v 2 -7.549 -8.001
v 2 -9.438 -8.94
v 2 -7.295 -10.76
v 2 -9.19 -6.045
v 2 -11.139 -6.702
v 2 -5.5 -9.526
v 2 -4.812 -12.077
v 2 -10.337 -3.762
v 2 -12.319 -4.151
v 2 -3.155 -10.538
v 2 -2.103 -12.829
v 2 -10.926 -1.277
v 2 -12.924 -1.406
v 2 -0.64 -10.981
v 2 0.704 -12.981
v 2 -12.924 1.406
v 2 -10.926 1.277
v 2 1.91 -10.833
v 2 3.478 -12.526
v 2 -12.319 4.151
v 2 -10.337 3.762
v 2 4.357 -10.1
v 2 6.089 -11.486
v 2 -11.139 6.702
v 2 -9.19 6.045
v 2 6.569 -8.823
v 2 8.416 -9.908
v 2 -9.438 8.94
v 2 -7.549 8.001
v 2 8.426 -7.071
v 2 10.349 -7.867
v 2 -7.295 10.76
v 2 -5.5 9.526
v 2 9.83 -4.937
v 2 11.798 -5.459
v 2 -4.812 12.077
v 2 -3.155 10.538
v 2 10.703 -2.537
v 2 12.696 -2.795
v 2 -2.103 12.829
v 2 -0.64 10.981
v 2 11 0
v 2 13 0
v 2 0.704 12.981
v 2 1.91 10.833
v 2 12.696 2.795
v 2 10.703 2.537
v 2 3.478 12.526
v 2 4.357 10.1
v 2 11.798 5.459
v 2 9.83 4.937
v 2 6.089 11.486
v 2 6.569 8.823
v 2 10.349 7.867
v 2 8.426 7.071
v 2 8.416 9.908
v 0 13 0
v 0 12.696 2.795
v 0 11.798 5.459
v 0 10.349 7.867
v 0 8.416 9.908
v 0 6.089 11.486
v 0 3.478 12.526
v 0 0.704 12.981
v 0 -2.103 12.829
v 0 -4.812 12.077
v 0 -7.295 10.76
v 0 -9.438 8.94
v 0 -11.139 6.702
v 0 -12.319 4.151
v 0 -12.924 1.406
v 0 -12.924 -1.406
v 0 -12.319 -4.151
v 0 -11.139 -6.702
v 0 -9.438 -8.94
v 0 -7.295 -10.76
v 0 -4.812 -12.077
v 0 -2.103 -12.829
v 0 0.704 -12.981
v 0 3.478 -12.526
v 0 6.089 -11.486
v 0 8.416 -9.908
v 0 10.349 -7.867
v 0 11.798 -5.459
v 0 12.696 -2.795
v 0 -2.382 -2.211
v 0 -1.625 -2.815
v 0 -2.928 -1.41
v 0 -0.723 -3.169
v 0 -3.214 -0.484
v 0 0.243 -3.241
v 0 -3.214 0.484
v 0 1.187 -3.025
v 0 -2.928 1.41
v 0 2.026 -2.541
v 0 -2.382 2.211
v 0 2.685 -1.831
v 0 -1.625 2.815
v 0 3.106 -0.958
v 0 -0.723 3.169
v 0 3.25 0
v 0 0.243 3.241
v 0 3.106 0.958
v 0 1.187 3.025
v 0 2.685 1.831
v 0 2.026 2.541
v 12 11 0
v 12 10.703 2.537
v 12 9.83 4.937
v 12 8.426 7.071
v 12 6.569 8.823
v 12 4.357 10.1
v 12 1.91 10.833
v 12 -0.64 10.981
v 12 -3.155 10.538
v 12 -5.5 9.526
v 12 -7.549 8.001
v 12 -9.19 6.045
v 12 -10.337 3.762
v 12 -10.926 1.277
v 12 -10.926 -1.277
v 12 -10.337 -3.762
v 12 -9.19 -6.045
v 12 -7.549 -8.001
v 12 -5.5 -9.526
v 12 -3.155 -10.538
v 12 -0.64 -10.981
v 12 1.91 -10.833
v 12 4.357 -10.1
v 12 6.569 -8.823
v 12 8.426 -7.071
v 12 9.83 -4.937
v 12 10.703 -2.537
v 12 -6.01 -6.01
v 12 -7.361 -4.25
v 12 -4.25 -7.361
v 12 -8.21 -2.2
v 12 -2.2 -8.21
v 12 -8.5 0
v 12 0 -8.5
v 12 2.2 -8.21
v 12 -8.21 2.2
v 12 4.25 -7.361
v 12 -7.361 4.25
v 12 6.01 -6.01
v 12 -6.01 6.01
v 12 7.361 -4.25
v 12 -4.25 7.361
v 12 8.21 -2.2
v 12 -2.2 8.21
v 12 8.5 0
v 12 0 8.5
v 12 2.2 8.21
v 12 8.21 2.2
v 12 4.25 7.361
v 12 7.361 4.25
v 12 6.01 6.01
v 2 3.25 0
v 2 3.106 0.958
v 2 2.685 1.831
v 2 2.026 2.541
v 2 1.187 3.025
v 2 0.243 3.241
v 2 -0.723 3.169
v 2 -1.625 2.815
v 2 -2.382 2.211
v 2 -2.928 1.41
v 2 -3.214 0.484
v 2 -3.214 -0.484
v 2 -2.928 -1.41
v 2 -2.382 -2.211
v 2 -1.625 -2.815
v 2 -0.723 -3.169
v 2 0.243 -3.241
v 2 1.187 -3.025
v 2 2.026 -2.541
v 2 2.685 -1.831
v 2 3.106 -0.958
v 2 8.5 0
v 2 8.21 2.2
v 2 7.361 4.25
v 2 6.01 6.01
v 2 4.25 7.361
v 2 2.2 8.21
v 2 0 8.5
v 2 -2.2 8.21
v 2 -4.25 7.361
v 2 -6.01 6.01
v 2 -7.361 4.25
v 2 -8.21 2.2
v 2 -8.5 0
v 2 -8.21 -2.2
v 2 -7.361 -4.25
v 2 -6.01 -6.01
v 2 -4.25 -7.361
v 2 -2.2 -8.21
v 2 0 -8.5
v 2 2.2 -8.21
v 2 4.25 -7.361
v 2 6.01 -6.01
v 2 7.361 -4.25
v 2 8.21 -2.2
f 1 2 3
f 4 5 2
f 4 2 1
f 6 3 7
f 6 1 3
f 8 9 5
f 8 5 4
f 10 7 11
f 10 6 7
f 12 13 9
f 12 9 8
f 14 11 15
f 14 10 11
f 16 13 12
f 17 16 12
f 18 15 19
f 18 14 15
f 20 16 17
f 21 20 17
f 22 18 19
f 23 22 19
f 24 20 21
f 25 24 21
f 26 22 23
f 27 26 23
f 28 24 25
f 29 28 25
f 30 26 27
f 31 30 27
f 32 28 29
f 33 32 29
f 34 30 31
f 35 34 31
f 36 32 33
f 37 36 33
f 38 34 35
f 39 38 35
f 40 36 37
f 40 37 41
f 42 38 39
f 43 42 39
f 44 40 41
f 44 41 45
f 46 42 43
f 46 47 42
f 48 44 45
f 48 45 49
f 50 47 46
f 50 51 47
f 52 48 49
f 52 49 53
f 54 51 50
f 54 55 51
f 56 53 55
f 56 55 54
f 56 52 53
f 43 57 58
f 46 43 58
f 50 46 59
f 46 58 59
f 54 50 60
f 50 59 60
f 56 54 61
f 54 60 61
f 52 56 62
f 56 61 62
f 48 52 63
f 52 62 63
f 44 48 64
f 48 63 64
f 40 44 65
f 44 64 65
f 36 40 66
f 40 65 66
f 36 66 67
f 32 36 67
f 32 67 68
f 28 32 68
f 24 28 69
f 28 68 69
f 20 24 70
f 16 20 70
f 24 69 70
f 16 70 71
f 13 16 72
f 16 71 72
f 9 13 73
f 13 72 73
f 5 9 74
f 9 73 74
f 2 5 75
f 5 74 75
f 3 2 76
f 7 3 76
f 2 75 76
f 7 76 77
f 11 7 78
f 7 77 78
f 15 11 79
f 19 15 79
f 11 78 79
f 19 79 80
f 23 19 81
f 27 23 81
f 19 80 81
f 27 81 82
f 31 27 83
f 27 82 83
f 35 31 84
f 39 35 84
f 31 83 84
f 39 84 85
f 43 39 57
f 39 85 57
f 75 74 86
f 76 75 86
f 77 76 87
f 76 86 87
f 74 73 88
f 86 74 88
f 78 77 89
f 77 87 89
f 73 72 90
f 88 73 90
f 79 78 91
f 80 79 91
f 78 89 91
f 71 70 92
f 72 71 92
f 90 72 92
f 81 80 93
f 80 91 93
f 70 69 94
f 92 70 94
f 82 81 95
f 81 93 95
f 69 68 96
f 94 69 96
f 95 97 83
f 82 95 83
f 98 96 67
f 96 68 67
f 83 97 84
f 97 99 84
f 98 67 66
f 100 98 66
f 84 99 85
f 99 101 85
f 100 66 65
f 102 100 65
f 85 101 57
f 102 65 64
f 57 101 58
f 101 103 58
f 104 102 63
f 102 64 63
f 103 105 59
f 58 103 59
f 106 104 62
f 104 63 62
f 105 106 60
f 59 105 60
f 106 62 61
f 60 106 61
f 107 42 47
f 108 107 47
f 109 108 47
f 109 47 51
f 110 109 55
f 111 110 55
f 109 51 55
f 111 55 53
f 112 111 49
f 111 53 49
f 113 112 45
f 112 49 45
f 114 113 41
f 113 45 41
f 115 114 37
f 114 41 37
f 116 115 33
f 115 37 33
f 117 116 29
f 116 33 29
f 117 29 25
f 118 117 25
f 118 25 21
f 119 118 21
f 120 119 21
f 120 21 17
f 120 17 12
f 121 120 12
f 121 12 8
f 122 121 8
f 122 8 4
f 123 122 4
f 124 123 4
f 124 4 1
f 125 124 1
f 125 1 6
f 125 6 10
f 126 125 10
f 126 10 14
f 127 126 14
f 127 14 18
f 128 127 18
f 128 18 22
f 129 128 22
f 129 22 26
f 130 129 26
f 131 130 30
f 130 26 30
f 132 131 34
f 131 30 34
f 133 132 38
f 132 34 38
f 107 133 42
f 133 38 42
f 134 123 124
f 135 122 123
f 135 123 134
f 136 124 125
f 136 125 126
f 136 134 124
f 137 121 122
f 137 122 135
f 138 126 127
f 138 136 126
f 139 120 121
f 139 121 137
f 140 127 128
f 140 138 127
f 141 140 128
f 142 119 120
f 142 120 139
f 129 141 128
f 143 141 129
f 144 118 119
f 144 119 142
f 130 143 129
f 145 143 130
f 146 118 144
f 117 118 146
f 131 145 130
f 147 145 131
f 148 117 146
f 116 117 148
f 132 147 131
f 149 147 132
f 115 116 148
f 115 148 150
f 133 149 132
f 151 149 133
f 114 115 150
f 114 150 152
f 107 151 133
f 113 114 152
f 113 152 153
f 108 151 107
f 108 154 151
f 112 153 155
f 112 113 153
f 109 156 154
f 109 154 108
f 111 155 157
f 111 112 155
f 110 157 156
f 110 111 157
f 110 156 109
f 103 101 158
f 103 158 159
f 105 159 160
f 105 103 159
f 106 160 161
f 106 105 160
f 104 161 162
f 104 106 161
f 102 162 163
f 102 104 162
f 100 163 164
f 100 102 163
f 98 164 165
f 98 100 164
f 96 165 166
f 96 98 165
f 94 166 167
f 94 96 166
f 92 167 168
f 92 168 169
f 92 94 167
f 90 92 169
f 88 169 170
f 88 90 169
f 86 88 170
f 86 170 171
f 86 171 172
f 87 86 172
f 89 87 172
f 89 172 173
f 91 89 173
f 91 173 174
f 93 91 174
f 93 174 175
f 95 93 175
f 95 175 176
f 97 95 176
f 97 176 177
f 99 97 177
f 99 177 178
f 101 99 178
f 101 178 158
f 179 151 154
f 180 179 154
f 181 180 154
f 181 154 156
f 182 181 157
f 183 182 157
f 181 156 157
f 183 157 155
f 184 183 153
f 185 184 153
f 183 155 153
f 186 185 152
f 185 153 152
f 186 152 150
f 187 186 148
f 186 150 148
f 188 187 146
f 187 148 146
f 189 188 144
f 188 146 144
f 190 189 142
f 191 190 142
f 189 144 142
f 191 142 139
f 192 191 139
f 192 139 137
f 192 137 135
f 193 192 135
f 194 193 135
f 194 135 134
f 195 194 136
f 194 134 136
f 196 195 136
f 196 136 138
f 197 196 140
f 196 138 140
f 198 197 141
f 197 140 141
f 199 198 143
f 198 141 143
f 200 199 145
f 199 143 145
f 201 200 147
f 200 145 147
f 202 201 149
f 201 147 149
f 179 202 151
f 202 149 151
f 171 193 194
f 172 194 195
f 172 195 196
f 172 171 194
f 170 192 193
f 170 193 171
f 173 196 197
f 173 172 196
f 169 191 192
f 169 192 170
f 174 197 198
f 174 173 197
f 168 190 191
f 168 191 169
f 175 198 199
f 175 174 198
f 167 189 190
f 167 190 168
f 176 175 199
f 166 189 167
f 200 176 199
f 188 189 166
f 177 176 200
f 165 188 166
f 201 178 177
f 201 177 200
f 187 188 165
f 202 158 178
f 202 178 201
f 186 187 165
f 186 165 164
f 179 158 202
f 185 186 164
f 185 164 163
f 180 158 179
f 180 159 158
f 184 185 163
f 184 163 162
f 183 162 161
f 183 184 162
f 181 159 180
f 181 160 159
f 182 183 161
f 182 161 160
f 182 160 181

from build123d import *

# Parameters (mm, degrees)
F0_R         = 11
F0_R_2       = 9
F0_R_3       = 3.25
F1_DEPTH     = 12
F2_R         = 8.5
F2_R_2       = 3.25
F3_DEPTH     = 10
F0_R_4       = 13
F1_FACE1_R   = 11
F1_FACE1_R_2 = 3.25
F4_DEPTH     = 2


with BuildPart() as f1:
    # F0 (on Right) → F1 (new body)
    with BuildSketch(Plane.YZ):
        Circle(F0_R)
        Circle(F0_R_2, mode=Mode.SUBTRACT)
        Circle(F0_R_2)
        Circle(F0_R_3, mode=Mode.SUBTRACT)
    extrude(amount=F1_DEPTH)

    # F2 (on face) → F3 (cut)
    with BuildSketch(Plane.YZ.offset(12)):
        Circle(F2_R)
        Circle(F2_R_2, mode=Mode.SUBTRACT)
    extrude(amount=-F3_DEPTH, mode=Mode.SUBTRACT)

    # F0 (on Right) + F1_face1 (on face) → F4 (join)
    with BuildSketch(Plane.YZ):
        Circle(F0_R_4)
        Circle(F0_R, mode=Mode.SUBTRACT)
        Circle(F0_R)
        Circle(F0_R_2, mode=Mode.SUBTRACT)
        Circle(F0_R_2)
        Circle(F0_R_3, mode=Mode.SUBTRACT)
    with BuildSketch(Plane(origin=(0, 0, 0), x_dir=(0, 1, 0), z_dir=(-1, 0, 0))):
        Circle(F1_FACE1_R)
        Circle(F1_FACE1_R_2, mode=Mode.SUBTRACT)
    extrude(amount=F4_DEPTH, dir=(1, 0, 0))


solid = f1.part
